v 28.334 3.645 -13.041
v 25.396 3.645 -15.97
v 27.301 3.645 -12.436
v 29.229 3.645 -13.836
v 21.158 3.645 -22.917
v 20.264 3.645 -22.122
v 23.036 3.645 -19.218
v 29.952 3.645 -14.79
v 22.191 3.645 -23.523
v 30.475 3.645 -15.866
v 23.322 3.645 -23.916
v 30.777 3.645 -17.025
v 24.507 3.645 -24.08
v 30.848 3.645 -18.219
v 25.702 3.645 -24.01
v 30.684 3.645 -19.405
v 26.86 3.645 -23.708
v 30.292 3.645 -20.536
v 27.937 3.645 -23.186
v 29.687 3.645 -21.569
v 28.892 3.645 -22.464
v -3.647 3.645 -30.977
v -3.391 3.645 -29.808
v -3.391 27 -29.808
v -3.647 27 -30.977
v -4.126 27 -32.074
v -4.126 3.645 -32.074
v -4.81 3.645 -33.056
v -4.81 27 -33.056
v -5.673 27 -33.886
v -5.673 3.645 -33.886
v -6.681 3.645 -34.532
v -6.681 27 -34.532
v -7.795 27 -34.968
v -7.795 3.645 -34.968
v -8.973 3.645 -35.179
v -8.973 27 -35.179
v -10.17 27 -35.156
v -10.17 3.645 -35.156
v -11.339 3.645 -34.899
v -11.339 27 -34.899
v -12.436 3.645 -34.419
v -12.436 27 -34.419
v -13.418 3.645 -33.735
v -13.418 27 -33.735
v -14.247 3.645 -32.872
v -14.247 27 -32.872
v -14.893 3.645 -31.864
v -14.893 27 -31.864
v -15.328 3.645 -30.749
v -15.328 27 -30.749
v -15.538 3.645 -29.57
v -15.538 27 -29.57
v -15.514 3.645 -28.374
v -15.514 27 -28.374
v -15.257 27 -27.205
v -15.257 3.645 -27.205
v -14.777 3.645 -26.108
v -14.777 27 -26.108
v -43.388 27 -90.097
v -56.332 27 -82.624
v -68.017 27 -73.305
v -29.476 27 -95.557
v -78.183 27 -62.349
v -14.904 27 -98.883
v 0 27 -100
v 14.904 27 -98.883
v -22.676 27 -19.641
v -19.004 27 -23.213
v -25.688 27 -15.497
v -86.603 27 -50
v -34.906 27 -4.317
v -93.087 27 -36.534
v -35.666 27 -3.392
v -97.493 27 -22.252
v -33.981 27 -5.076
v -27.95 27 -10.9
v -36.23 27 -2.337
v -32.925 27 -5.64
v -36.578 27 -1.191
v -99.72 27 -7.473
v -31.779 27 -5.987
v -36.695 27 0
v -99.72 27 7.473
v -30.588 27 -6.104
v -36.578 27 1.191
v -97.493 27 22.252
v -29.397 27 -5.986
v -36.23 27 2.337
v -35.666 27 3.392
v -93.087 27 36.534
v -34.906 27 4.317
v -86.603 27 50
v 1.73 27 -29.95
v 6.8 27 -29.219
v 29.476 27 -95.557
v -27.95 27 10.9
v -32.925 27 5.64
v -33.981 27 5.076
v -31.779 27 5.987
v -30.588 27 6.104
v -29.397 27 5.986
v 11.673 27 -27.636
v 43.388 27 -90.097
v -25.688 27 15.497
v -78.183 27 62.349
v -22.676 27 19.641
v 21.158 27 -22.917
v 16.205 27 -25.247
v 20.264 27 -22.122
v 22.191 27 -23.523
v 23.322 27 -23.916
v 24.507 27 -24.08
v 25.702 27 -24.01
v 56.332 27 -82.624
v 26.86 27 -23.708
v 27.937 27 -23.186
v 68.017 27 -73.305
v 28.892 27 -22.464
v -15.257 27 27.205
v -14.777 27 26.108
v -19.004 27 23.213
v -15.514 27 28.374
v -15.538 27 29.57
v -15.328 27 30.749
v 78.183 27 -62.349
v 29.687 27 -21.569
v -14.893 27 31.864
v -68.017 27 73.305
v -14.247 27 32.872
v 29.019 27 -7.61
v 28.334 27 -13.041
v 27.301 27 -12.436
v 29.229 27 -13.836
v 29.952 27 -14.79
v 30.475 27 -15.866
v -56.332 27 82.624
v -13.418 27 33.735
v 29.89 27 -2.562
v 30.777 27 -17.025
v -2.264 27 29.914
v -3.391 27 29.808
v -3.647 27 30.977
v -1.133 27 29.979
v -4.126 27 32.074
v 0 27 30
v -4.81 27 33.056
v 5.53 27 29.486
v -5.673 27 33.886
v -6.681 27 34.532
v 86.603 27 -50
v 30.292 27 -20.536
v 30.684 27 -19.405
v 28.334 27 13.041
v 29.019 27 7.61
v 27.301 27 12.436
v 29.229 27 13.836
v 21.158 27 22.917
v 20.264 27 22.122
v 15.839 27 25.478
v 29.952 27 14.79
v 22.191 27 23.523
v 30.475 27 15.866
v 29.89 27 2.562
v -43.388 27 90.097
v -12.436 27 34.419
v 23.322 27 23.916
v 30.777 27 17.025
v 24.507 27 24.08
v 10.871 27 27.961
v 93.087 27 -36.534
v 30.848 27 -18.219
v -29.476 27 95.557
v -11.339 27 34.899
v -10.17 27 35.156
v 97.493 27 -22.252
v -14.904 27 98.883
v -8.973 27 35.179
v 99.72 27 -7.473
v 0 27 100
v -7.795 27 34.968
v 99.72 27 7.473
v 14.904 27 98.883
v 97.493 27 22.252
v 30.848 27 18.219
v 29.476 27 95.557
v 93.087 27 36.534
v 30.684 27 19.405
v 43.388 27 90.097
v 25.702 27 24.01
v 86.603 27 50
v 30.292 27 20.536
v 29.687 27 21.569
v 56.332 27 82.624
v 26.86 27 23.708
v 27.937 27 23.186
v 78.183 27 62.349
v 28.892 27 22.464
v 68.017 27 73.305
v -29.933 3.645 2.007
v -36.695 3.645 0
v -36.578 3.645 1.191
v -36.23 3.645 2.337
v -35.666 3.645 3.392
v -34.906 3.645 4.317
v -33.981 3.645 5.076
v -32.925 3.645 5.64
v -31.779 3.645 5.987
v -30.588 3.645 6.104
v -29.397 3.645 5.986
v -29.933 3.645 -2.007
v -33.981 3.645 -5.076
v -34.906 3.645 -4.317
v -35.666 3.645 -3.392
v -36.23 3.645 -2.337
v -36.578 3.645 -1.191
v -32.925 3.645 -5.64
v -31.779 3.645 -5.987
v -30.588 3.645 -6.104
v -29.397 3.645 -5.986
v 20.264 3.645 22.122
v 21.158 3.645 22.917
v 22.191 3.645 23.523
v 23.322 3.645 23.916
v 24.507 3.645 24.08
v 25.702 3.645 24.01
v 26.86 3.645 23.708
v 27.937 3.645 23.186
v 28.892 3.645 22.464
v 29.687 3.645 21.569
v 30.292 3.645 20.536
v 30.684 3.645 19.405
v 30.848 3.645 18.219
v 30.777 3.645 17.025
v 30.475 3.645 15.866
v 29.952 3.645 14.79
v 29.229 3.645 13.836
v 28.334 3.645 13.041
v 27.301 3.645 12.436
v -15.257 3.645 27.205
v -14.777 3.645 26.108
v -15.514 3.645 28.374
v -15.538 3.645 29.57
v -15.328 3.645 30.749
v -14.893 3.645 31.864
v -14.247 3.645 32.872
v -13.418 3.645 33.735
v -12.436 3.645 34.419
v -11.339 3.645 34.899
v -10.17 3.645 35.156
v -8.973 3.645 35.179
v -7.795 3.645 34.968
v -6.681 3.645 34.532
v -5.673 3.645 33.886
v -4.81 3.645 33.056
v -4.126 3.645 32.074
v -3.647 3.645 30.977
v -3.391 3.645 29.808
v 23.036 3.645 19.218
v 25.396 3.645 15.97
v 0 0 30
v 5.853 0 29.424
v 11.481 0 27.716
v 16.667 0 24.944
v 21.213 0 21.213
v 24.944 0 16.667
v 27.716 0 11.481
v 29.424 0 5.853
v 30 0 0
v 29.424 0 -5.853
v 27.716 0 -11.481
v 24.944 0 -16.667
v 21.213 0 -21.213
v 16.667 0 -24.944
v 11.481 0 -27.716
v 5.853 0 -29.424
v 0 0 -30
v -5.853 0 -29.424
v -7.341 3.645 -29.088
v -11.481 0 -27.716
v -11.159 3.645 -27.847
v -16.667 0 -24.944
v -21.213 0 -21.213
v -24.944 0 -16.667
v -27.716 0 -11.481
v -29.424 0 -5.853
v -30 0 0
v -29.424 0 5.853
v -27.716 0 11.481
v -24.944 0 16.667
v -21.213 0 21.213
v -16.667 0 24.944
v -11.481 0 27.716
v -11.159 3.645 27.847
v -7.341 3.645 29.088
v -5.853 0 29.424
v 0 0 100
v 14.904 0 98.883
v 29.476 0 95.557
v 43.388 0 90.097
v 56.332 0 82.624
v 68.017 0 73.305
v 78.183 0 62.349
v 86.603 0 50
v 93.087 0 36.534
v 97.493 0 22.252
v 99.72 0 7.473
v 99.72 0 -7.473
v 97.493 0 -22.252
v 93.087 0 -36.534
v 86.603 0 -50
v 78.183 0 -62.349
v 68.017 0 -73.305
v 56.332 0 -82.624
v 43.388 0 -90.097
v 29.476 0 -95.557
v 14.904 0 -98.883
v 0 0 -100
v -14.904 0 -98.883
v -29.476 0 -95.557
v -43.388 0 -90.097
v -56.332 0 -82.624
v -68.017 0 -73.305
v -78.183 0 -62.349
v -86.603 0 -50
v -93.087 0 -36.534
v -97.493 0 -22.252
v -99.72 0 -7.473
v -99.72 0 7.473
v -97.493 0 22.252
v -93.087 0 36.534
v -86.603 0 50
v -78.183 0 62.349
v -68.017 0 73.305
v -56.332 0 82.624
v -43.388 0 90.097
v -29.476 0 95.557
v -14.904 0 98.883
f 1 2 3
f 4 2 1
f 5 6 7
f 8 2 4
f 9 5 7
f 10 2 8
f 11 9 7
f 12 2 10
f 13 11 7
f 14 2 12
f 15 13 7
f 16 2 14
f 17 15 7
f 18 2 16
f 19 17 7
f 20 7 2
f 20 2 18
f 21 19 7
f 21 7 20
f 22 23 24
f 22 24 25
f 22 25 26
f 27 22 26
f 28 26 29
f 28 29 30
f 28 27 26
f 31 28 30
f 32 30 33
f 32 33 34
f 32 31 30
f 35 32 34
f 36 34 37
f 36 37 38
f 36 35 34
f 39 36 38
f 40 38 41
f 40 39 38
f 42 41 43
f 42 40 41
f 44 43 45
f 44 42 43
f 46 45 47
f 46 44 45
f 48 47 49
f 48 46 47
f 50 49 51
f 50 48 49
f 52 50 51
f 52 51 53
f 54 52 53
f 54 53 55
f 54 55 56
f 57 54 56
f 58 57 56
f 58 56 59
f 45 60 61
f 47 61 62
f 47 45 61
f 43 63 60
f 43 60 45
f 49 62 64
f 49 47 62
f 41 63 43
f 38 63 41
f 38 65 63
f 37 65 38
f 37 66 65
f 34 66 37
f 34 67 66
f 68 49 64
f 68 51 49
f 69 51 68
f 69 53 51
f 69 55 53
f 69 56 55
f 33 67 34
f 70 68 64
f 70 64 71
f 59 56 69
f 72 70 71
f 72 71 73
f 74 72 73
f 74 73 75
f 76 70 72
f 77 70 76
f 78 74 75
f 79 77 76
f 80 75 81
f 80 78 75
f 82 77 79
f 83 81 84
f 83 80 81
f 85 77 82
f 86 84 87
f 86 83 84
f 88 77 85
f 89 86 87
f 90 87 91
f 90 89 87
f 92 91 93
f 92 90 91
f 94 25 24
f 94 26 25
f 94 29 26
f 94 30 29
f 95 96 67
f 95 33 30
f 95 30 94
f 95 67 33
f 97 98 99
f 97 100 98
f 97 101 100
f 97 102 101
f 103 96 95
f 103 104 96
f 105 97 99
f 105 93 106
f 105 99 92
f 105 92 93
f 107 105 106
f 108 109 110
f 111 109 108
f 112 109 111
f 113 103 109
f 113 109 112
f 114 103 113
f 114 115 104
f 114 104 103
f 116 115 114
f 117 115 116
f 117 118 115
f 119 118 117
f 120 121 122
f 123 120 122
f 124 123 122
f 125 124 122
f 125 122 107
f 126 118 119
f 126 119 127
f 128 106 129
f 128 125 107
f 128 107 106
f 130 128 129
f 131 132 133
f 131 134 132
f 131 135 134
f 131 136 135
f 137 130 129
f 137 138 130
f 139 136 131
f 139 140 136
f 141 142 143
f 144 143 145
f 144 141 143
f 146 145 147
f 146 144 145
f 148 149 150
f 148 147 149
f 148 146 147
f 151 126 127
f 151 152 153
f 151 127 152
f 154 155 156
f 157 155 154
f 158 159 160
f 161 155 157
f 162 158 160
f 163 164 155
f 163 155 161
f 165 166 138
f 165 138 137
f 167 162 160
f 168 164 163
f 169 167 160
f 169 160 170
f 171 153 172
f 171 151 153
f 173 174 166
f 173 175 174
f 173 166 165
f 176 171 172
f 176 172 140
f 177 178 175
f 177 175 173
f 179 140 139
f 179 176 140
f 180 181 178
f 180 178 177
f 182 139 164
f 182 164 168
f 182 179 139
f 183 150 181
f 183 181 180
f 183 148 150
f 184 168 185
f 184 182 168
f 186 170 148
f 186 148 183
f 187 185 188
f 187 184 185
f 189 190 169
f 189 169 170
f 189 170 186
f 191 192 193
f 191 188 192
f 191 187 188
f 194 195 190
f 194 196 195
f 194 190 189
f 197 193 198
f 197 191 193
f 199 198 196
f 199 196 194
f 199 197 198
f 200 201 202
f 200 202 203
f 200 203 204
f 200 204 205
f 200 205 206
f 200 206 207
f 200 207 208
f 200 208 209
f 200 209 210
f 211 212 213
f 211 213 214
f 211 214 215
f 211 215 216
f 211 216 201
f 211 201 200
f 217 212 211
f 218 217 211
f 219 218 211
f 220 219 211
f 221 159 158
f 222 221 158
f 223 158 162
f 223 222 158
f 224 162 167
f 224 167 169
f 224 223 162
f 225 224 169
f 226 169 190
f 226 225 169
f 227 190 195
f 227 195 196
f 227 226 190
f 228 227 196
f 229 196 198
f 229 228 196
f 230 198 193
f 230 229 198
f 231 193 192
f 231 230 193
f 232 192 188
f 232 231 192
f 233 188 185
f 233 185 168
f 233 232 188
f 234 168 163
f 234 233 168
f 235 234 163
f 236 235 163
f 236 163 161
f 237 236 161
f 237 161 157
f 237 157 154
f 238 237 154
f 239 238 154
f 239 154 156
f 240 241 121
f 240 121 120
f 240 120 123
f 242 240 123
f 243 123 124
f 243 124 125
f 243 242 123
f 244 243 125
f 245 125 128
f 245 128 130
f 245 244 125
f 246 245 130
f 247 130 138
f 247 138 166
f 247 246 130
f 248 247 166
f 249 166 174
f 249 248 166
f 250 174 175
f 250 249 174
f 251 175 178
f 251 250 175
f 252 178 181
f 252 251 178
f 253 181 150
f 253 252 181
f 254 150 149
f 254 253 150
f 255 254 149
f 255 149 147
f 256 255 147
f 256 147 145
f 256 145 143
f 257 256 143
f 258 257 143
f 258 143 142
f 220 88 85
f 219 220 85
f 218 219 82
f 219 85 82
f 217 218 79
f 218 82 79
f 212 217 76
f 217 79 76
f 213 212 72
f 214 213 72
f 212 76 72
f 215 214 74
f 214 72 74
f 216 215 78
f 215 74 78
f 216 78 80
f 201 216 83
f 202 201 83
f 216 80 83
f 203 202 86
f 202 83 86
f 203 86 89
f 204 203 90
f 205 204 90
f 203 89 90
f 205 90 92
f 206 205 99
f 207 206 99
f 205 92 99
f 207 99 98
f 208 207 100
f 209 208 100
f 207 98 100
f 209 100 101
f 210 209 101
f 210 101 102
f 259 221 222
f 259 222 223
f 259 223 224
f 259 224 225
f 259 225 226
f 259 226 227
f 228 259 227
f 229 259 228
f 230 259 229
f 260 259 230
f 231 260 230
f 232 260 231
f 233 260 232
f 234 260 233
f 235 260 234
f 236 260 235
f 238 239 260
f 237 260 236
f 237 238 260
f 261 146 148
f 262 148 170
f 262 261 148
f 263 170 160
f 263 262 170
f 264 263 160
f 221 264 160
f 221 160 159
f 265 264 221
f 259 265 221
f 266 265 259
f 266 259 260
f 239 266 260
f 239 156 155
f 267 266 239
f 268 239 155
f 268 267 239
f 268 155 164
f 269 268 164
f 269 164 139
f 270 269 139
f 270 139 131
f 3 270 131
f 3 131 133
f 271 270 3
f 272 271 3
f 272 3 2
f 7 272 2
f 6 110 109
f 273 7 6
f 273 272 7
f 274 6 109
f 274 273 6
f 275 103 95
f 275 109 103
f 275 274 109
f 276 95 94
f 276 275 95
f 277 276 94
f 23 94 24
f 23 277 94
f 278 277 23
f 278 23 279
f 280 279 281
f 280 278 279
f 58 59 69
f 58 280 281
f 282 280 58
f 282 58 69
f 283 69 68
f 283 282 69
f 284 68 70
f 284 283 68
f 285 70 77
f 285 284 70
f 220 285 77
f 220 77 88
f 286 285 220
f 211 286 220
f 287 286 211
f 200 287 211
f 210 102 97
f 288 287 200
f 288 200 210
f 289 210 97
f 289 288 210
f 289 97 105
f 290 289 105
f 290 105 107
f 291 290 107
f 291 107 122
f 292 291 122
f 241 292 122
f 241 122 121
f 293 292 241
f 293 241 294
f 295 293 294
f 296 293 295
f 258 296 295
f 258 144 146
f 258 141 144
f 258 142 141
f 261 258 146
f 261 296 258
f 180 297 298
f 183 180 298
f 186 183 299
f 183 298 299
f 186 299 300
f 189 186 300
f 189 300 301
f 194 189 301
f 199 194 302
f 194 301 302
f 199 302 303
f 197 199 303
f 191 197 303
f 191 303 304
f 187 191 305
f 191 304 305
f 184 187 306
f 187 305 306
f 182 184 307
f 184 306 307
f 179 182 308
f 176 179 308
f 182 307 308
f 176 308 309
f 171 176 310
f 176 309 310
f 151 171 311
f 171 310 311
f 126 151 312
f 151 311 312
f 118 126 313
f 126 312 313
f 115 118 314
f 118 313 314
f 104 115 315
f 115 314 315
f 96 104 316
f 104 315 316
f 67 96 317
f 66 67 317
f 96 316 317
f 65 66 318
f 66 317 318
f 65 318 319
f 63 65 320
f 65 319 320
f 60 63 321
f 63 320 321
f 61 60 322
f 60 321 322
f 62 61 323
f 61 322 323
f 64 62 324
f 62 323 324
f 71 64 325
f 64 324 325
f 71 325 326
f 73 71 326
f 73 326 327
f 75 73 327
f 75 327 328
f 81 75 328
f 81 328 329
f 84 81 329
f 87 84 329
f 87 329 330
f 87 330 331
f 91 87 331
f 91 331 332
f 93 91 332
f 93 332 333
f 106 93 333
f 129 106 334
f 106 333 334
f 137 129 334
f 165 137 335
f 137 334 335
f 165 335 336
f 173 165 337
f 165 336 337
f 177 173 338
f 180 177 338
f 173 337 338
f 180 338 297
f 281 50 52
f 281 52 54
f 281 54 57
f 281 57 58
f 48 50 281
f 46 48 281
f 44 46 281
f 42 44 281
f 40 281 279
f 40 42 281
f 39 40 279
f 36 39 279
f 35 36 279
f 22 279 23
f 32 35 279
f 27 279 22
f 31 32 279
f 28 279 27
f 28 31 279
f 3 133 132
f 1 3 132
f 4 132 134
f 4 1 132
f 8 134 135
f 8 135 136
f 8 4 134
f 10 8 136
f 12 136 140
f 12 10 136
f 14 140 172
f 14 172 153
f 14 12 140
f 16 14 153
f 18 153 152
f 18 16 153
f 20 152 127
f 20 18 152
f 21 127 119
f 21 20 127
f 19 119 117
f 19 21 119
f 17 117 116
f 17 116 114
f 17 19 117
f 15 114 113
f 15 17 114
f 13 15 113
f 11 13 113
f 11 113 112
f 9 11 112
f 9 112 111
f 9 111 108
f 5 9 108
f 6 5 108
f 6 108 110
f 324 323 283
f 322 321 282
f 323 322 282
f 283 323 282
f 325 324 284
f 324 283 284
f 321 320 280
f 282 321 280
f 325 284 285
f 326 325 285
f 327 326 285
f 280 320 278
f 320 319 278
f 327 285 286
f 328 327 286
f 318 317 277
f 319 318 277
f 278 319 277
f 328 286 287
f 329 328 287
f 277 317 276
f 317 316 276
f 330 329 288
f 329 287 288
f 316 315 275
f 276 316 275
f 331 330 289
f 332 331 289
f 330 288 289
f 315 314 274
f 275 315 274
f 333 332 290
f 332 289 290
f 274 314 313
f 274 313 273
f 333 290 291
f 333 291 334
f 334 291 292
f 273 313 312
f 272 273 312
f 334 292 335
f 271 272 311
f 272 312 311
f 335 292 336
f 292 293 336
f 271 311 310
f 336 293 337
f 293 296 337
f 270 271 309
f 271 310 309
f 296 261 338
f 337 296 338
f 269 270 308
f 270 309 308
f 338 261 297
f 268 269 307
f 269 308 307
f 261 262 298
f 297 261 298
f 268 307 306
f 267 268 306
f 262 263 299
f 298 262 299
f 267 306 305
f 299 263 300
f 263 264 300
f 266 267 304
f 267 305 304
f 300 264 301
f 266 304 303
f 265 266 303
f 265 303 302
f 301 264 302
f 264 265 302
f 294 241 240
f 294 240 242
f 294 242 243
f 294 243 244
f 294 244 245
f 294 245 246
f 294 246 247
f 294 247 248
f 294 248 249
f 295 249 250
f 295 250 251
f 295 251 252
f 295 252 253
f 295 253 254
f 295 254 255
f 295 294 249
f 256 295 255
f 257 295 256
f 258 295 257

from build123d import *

# Parameters (mm, degrees)
SKETCH1_R           = 100
BOSS_EXTRUDE1_DEPTH = 27
SKETCH2_R           = 30
CUT_EXTRUDE1_DEPTH  = 144.975692393
SKETCH3_R           = 6.103815366
CUT_EXTRUDE2_DEPTH  = 23.355243157
CIRPATTERN1_COUNT   = 5


with BuildPart() as part:
    # Sketch1 → Boss-Extrude1 (new body)
    with BuildSketch(Plane(origin=(0, 0, 0), x_dir=(1, 0, 0), z_dir=(0, 1, 0))):
        Circle(SKETCH1_R)
    extrude(amount=BOSS_EXTRUDE1_DEPTH)

    # Sketch2 → Cut-Extrude1 (cut, through all)
    with BuildSketch(Plane(origin=(0, 0, 0), x_dir=(1, 0, 0), z_dir=(0, 1, 0))):
        Circle(SKETCH2_R)
    extrude(amount=CUT_EXTRUDE1_DEPTH, mode=Mode.SUBTRACT)

    # Sketch3 → Cut-Extrude2 (cut)
    with BuildSketch(Plane(origin=(0, 27, 0), x_dir=(1, 0, 0), z_dir=(0, 1, 0))):
        with Locations((-30.591261491, 0)):
            Circle(SKETCH3_R)
    cut_extrude2 = extrude(amount=-CUT_EXTRUDE2_DEPTH, mode=Mode.SUBTRACT)

    # CirPattern1: Cut-Extrude2 ×5 about axis
    cirpattern1_axis = Axis((0, 0, 0), (0, 1, 0))
    for i in range(1, CIRPATTERN1_COUNT):
        add(cut_extrude2.rotate(cirpattern1_axis, i * 360 / CIRPATTERN1_COUNT), mode=Mode.SUBTRACT)


solid = part.part
